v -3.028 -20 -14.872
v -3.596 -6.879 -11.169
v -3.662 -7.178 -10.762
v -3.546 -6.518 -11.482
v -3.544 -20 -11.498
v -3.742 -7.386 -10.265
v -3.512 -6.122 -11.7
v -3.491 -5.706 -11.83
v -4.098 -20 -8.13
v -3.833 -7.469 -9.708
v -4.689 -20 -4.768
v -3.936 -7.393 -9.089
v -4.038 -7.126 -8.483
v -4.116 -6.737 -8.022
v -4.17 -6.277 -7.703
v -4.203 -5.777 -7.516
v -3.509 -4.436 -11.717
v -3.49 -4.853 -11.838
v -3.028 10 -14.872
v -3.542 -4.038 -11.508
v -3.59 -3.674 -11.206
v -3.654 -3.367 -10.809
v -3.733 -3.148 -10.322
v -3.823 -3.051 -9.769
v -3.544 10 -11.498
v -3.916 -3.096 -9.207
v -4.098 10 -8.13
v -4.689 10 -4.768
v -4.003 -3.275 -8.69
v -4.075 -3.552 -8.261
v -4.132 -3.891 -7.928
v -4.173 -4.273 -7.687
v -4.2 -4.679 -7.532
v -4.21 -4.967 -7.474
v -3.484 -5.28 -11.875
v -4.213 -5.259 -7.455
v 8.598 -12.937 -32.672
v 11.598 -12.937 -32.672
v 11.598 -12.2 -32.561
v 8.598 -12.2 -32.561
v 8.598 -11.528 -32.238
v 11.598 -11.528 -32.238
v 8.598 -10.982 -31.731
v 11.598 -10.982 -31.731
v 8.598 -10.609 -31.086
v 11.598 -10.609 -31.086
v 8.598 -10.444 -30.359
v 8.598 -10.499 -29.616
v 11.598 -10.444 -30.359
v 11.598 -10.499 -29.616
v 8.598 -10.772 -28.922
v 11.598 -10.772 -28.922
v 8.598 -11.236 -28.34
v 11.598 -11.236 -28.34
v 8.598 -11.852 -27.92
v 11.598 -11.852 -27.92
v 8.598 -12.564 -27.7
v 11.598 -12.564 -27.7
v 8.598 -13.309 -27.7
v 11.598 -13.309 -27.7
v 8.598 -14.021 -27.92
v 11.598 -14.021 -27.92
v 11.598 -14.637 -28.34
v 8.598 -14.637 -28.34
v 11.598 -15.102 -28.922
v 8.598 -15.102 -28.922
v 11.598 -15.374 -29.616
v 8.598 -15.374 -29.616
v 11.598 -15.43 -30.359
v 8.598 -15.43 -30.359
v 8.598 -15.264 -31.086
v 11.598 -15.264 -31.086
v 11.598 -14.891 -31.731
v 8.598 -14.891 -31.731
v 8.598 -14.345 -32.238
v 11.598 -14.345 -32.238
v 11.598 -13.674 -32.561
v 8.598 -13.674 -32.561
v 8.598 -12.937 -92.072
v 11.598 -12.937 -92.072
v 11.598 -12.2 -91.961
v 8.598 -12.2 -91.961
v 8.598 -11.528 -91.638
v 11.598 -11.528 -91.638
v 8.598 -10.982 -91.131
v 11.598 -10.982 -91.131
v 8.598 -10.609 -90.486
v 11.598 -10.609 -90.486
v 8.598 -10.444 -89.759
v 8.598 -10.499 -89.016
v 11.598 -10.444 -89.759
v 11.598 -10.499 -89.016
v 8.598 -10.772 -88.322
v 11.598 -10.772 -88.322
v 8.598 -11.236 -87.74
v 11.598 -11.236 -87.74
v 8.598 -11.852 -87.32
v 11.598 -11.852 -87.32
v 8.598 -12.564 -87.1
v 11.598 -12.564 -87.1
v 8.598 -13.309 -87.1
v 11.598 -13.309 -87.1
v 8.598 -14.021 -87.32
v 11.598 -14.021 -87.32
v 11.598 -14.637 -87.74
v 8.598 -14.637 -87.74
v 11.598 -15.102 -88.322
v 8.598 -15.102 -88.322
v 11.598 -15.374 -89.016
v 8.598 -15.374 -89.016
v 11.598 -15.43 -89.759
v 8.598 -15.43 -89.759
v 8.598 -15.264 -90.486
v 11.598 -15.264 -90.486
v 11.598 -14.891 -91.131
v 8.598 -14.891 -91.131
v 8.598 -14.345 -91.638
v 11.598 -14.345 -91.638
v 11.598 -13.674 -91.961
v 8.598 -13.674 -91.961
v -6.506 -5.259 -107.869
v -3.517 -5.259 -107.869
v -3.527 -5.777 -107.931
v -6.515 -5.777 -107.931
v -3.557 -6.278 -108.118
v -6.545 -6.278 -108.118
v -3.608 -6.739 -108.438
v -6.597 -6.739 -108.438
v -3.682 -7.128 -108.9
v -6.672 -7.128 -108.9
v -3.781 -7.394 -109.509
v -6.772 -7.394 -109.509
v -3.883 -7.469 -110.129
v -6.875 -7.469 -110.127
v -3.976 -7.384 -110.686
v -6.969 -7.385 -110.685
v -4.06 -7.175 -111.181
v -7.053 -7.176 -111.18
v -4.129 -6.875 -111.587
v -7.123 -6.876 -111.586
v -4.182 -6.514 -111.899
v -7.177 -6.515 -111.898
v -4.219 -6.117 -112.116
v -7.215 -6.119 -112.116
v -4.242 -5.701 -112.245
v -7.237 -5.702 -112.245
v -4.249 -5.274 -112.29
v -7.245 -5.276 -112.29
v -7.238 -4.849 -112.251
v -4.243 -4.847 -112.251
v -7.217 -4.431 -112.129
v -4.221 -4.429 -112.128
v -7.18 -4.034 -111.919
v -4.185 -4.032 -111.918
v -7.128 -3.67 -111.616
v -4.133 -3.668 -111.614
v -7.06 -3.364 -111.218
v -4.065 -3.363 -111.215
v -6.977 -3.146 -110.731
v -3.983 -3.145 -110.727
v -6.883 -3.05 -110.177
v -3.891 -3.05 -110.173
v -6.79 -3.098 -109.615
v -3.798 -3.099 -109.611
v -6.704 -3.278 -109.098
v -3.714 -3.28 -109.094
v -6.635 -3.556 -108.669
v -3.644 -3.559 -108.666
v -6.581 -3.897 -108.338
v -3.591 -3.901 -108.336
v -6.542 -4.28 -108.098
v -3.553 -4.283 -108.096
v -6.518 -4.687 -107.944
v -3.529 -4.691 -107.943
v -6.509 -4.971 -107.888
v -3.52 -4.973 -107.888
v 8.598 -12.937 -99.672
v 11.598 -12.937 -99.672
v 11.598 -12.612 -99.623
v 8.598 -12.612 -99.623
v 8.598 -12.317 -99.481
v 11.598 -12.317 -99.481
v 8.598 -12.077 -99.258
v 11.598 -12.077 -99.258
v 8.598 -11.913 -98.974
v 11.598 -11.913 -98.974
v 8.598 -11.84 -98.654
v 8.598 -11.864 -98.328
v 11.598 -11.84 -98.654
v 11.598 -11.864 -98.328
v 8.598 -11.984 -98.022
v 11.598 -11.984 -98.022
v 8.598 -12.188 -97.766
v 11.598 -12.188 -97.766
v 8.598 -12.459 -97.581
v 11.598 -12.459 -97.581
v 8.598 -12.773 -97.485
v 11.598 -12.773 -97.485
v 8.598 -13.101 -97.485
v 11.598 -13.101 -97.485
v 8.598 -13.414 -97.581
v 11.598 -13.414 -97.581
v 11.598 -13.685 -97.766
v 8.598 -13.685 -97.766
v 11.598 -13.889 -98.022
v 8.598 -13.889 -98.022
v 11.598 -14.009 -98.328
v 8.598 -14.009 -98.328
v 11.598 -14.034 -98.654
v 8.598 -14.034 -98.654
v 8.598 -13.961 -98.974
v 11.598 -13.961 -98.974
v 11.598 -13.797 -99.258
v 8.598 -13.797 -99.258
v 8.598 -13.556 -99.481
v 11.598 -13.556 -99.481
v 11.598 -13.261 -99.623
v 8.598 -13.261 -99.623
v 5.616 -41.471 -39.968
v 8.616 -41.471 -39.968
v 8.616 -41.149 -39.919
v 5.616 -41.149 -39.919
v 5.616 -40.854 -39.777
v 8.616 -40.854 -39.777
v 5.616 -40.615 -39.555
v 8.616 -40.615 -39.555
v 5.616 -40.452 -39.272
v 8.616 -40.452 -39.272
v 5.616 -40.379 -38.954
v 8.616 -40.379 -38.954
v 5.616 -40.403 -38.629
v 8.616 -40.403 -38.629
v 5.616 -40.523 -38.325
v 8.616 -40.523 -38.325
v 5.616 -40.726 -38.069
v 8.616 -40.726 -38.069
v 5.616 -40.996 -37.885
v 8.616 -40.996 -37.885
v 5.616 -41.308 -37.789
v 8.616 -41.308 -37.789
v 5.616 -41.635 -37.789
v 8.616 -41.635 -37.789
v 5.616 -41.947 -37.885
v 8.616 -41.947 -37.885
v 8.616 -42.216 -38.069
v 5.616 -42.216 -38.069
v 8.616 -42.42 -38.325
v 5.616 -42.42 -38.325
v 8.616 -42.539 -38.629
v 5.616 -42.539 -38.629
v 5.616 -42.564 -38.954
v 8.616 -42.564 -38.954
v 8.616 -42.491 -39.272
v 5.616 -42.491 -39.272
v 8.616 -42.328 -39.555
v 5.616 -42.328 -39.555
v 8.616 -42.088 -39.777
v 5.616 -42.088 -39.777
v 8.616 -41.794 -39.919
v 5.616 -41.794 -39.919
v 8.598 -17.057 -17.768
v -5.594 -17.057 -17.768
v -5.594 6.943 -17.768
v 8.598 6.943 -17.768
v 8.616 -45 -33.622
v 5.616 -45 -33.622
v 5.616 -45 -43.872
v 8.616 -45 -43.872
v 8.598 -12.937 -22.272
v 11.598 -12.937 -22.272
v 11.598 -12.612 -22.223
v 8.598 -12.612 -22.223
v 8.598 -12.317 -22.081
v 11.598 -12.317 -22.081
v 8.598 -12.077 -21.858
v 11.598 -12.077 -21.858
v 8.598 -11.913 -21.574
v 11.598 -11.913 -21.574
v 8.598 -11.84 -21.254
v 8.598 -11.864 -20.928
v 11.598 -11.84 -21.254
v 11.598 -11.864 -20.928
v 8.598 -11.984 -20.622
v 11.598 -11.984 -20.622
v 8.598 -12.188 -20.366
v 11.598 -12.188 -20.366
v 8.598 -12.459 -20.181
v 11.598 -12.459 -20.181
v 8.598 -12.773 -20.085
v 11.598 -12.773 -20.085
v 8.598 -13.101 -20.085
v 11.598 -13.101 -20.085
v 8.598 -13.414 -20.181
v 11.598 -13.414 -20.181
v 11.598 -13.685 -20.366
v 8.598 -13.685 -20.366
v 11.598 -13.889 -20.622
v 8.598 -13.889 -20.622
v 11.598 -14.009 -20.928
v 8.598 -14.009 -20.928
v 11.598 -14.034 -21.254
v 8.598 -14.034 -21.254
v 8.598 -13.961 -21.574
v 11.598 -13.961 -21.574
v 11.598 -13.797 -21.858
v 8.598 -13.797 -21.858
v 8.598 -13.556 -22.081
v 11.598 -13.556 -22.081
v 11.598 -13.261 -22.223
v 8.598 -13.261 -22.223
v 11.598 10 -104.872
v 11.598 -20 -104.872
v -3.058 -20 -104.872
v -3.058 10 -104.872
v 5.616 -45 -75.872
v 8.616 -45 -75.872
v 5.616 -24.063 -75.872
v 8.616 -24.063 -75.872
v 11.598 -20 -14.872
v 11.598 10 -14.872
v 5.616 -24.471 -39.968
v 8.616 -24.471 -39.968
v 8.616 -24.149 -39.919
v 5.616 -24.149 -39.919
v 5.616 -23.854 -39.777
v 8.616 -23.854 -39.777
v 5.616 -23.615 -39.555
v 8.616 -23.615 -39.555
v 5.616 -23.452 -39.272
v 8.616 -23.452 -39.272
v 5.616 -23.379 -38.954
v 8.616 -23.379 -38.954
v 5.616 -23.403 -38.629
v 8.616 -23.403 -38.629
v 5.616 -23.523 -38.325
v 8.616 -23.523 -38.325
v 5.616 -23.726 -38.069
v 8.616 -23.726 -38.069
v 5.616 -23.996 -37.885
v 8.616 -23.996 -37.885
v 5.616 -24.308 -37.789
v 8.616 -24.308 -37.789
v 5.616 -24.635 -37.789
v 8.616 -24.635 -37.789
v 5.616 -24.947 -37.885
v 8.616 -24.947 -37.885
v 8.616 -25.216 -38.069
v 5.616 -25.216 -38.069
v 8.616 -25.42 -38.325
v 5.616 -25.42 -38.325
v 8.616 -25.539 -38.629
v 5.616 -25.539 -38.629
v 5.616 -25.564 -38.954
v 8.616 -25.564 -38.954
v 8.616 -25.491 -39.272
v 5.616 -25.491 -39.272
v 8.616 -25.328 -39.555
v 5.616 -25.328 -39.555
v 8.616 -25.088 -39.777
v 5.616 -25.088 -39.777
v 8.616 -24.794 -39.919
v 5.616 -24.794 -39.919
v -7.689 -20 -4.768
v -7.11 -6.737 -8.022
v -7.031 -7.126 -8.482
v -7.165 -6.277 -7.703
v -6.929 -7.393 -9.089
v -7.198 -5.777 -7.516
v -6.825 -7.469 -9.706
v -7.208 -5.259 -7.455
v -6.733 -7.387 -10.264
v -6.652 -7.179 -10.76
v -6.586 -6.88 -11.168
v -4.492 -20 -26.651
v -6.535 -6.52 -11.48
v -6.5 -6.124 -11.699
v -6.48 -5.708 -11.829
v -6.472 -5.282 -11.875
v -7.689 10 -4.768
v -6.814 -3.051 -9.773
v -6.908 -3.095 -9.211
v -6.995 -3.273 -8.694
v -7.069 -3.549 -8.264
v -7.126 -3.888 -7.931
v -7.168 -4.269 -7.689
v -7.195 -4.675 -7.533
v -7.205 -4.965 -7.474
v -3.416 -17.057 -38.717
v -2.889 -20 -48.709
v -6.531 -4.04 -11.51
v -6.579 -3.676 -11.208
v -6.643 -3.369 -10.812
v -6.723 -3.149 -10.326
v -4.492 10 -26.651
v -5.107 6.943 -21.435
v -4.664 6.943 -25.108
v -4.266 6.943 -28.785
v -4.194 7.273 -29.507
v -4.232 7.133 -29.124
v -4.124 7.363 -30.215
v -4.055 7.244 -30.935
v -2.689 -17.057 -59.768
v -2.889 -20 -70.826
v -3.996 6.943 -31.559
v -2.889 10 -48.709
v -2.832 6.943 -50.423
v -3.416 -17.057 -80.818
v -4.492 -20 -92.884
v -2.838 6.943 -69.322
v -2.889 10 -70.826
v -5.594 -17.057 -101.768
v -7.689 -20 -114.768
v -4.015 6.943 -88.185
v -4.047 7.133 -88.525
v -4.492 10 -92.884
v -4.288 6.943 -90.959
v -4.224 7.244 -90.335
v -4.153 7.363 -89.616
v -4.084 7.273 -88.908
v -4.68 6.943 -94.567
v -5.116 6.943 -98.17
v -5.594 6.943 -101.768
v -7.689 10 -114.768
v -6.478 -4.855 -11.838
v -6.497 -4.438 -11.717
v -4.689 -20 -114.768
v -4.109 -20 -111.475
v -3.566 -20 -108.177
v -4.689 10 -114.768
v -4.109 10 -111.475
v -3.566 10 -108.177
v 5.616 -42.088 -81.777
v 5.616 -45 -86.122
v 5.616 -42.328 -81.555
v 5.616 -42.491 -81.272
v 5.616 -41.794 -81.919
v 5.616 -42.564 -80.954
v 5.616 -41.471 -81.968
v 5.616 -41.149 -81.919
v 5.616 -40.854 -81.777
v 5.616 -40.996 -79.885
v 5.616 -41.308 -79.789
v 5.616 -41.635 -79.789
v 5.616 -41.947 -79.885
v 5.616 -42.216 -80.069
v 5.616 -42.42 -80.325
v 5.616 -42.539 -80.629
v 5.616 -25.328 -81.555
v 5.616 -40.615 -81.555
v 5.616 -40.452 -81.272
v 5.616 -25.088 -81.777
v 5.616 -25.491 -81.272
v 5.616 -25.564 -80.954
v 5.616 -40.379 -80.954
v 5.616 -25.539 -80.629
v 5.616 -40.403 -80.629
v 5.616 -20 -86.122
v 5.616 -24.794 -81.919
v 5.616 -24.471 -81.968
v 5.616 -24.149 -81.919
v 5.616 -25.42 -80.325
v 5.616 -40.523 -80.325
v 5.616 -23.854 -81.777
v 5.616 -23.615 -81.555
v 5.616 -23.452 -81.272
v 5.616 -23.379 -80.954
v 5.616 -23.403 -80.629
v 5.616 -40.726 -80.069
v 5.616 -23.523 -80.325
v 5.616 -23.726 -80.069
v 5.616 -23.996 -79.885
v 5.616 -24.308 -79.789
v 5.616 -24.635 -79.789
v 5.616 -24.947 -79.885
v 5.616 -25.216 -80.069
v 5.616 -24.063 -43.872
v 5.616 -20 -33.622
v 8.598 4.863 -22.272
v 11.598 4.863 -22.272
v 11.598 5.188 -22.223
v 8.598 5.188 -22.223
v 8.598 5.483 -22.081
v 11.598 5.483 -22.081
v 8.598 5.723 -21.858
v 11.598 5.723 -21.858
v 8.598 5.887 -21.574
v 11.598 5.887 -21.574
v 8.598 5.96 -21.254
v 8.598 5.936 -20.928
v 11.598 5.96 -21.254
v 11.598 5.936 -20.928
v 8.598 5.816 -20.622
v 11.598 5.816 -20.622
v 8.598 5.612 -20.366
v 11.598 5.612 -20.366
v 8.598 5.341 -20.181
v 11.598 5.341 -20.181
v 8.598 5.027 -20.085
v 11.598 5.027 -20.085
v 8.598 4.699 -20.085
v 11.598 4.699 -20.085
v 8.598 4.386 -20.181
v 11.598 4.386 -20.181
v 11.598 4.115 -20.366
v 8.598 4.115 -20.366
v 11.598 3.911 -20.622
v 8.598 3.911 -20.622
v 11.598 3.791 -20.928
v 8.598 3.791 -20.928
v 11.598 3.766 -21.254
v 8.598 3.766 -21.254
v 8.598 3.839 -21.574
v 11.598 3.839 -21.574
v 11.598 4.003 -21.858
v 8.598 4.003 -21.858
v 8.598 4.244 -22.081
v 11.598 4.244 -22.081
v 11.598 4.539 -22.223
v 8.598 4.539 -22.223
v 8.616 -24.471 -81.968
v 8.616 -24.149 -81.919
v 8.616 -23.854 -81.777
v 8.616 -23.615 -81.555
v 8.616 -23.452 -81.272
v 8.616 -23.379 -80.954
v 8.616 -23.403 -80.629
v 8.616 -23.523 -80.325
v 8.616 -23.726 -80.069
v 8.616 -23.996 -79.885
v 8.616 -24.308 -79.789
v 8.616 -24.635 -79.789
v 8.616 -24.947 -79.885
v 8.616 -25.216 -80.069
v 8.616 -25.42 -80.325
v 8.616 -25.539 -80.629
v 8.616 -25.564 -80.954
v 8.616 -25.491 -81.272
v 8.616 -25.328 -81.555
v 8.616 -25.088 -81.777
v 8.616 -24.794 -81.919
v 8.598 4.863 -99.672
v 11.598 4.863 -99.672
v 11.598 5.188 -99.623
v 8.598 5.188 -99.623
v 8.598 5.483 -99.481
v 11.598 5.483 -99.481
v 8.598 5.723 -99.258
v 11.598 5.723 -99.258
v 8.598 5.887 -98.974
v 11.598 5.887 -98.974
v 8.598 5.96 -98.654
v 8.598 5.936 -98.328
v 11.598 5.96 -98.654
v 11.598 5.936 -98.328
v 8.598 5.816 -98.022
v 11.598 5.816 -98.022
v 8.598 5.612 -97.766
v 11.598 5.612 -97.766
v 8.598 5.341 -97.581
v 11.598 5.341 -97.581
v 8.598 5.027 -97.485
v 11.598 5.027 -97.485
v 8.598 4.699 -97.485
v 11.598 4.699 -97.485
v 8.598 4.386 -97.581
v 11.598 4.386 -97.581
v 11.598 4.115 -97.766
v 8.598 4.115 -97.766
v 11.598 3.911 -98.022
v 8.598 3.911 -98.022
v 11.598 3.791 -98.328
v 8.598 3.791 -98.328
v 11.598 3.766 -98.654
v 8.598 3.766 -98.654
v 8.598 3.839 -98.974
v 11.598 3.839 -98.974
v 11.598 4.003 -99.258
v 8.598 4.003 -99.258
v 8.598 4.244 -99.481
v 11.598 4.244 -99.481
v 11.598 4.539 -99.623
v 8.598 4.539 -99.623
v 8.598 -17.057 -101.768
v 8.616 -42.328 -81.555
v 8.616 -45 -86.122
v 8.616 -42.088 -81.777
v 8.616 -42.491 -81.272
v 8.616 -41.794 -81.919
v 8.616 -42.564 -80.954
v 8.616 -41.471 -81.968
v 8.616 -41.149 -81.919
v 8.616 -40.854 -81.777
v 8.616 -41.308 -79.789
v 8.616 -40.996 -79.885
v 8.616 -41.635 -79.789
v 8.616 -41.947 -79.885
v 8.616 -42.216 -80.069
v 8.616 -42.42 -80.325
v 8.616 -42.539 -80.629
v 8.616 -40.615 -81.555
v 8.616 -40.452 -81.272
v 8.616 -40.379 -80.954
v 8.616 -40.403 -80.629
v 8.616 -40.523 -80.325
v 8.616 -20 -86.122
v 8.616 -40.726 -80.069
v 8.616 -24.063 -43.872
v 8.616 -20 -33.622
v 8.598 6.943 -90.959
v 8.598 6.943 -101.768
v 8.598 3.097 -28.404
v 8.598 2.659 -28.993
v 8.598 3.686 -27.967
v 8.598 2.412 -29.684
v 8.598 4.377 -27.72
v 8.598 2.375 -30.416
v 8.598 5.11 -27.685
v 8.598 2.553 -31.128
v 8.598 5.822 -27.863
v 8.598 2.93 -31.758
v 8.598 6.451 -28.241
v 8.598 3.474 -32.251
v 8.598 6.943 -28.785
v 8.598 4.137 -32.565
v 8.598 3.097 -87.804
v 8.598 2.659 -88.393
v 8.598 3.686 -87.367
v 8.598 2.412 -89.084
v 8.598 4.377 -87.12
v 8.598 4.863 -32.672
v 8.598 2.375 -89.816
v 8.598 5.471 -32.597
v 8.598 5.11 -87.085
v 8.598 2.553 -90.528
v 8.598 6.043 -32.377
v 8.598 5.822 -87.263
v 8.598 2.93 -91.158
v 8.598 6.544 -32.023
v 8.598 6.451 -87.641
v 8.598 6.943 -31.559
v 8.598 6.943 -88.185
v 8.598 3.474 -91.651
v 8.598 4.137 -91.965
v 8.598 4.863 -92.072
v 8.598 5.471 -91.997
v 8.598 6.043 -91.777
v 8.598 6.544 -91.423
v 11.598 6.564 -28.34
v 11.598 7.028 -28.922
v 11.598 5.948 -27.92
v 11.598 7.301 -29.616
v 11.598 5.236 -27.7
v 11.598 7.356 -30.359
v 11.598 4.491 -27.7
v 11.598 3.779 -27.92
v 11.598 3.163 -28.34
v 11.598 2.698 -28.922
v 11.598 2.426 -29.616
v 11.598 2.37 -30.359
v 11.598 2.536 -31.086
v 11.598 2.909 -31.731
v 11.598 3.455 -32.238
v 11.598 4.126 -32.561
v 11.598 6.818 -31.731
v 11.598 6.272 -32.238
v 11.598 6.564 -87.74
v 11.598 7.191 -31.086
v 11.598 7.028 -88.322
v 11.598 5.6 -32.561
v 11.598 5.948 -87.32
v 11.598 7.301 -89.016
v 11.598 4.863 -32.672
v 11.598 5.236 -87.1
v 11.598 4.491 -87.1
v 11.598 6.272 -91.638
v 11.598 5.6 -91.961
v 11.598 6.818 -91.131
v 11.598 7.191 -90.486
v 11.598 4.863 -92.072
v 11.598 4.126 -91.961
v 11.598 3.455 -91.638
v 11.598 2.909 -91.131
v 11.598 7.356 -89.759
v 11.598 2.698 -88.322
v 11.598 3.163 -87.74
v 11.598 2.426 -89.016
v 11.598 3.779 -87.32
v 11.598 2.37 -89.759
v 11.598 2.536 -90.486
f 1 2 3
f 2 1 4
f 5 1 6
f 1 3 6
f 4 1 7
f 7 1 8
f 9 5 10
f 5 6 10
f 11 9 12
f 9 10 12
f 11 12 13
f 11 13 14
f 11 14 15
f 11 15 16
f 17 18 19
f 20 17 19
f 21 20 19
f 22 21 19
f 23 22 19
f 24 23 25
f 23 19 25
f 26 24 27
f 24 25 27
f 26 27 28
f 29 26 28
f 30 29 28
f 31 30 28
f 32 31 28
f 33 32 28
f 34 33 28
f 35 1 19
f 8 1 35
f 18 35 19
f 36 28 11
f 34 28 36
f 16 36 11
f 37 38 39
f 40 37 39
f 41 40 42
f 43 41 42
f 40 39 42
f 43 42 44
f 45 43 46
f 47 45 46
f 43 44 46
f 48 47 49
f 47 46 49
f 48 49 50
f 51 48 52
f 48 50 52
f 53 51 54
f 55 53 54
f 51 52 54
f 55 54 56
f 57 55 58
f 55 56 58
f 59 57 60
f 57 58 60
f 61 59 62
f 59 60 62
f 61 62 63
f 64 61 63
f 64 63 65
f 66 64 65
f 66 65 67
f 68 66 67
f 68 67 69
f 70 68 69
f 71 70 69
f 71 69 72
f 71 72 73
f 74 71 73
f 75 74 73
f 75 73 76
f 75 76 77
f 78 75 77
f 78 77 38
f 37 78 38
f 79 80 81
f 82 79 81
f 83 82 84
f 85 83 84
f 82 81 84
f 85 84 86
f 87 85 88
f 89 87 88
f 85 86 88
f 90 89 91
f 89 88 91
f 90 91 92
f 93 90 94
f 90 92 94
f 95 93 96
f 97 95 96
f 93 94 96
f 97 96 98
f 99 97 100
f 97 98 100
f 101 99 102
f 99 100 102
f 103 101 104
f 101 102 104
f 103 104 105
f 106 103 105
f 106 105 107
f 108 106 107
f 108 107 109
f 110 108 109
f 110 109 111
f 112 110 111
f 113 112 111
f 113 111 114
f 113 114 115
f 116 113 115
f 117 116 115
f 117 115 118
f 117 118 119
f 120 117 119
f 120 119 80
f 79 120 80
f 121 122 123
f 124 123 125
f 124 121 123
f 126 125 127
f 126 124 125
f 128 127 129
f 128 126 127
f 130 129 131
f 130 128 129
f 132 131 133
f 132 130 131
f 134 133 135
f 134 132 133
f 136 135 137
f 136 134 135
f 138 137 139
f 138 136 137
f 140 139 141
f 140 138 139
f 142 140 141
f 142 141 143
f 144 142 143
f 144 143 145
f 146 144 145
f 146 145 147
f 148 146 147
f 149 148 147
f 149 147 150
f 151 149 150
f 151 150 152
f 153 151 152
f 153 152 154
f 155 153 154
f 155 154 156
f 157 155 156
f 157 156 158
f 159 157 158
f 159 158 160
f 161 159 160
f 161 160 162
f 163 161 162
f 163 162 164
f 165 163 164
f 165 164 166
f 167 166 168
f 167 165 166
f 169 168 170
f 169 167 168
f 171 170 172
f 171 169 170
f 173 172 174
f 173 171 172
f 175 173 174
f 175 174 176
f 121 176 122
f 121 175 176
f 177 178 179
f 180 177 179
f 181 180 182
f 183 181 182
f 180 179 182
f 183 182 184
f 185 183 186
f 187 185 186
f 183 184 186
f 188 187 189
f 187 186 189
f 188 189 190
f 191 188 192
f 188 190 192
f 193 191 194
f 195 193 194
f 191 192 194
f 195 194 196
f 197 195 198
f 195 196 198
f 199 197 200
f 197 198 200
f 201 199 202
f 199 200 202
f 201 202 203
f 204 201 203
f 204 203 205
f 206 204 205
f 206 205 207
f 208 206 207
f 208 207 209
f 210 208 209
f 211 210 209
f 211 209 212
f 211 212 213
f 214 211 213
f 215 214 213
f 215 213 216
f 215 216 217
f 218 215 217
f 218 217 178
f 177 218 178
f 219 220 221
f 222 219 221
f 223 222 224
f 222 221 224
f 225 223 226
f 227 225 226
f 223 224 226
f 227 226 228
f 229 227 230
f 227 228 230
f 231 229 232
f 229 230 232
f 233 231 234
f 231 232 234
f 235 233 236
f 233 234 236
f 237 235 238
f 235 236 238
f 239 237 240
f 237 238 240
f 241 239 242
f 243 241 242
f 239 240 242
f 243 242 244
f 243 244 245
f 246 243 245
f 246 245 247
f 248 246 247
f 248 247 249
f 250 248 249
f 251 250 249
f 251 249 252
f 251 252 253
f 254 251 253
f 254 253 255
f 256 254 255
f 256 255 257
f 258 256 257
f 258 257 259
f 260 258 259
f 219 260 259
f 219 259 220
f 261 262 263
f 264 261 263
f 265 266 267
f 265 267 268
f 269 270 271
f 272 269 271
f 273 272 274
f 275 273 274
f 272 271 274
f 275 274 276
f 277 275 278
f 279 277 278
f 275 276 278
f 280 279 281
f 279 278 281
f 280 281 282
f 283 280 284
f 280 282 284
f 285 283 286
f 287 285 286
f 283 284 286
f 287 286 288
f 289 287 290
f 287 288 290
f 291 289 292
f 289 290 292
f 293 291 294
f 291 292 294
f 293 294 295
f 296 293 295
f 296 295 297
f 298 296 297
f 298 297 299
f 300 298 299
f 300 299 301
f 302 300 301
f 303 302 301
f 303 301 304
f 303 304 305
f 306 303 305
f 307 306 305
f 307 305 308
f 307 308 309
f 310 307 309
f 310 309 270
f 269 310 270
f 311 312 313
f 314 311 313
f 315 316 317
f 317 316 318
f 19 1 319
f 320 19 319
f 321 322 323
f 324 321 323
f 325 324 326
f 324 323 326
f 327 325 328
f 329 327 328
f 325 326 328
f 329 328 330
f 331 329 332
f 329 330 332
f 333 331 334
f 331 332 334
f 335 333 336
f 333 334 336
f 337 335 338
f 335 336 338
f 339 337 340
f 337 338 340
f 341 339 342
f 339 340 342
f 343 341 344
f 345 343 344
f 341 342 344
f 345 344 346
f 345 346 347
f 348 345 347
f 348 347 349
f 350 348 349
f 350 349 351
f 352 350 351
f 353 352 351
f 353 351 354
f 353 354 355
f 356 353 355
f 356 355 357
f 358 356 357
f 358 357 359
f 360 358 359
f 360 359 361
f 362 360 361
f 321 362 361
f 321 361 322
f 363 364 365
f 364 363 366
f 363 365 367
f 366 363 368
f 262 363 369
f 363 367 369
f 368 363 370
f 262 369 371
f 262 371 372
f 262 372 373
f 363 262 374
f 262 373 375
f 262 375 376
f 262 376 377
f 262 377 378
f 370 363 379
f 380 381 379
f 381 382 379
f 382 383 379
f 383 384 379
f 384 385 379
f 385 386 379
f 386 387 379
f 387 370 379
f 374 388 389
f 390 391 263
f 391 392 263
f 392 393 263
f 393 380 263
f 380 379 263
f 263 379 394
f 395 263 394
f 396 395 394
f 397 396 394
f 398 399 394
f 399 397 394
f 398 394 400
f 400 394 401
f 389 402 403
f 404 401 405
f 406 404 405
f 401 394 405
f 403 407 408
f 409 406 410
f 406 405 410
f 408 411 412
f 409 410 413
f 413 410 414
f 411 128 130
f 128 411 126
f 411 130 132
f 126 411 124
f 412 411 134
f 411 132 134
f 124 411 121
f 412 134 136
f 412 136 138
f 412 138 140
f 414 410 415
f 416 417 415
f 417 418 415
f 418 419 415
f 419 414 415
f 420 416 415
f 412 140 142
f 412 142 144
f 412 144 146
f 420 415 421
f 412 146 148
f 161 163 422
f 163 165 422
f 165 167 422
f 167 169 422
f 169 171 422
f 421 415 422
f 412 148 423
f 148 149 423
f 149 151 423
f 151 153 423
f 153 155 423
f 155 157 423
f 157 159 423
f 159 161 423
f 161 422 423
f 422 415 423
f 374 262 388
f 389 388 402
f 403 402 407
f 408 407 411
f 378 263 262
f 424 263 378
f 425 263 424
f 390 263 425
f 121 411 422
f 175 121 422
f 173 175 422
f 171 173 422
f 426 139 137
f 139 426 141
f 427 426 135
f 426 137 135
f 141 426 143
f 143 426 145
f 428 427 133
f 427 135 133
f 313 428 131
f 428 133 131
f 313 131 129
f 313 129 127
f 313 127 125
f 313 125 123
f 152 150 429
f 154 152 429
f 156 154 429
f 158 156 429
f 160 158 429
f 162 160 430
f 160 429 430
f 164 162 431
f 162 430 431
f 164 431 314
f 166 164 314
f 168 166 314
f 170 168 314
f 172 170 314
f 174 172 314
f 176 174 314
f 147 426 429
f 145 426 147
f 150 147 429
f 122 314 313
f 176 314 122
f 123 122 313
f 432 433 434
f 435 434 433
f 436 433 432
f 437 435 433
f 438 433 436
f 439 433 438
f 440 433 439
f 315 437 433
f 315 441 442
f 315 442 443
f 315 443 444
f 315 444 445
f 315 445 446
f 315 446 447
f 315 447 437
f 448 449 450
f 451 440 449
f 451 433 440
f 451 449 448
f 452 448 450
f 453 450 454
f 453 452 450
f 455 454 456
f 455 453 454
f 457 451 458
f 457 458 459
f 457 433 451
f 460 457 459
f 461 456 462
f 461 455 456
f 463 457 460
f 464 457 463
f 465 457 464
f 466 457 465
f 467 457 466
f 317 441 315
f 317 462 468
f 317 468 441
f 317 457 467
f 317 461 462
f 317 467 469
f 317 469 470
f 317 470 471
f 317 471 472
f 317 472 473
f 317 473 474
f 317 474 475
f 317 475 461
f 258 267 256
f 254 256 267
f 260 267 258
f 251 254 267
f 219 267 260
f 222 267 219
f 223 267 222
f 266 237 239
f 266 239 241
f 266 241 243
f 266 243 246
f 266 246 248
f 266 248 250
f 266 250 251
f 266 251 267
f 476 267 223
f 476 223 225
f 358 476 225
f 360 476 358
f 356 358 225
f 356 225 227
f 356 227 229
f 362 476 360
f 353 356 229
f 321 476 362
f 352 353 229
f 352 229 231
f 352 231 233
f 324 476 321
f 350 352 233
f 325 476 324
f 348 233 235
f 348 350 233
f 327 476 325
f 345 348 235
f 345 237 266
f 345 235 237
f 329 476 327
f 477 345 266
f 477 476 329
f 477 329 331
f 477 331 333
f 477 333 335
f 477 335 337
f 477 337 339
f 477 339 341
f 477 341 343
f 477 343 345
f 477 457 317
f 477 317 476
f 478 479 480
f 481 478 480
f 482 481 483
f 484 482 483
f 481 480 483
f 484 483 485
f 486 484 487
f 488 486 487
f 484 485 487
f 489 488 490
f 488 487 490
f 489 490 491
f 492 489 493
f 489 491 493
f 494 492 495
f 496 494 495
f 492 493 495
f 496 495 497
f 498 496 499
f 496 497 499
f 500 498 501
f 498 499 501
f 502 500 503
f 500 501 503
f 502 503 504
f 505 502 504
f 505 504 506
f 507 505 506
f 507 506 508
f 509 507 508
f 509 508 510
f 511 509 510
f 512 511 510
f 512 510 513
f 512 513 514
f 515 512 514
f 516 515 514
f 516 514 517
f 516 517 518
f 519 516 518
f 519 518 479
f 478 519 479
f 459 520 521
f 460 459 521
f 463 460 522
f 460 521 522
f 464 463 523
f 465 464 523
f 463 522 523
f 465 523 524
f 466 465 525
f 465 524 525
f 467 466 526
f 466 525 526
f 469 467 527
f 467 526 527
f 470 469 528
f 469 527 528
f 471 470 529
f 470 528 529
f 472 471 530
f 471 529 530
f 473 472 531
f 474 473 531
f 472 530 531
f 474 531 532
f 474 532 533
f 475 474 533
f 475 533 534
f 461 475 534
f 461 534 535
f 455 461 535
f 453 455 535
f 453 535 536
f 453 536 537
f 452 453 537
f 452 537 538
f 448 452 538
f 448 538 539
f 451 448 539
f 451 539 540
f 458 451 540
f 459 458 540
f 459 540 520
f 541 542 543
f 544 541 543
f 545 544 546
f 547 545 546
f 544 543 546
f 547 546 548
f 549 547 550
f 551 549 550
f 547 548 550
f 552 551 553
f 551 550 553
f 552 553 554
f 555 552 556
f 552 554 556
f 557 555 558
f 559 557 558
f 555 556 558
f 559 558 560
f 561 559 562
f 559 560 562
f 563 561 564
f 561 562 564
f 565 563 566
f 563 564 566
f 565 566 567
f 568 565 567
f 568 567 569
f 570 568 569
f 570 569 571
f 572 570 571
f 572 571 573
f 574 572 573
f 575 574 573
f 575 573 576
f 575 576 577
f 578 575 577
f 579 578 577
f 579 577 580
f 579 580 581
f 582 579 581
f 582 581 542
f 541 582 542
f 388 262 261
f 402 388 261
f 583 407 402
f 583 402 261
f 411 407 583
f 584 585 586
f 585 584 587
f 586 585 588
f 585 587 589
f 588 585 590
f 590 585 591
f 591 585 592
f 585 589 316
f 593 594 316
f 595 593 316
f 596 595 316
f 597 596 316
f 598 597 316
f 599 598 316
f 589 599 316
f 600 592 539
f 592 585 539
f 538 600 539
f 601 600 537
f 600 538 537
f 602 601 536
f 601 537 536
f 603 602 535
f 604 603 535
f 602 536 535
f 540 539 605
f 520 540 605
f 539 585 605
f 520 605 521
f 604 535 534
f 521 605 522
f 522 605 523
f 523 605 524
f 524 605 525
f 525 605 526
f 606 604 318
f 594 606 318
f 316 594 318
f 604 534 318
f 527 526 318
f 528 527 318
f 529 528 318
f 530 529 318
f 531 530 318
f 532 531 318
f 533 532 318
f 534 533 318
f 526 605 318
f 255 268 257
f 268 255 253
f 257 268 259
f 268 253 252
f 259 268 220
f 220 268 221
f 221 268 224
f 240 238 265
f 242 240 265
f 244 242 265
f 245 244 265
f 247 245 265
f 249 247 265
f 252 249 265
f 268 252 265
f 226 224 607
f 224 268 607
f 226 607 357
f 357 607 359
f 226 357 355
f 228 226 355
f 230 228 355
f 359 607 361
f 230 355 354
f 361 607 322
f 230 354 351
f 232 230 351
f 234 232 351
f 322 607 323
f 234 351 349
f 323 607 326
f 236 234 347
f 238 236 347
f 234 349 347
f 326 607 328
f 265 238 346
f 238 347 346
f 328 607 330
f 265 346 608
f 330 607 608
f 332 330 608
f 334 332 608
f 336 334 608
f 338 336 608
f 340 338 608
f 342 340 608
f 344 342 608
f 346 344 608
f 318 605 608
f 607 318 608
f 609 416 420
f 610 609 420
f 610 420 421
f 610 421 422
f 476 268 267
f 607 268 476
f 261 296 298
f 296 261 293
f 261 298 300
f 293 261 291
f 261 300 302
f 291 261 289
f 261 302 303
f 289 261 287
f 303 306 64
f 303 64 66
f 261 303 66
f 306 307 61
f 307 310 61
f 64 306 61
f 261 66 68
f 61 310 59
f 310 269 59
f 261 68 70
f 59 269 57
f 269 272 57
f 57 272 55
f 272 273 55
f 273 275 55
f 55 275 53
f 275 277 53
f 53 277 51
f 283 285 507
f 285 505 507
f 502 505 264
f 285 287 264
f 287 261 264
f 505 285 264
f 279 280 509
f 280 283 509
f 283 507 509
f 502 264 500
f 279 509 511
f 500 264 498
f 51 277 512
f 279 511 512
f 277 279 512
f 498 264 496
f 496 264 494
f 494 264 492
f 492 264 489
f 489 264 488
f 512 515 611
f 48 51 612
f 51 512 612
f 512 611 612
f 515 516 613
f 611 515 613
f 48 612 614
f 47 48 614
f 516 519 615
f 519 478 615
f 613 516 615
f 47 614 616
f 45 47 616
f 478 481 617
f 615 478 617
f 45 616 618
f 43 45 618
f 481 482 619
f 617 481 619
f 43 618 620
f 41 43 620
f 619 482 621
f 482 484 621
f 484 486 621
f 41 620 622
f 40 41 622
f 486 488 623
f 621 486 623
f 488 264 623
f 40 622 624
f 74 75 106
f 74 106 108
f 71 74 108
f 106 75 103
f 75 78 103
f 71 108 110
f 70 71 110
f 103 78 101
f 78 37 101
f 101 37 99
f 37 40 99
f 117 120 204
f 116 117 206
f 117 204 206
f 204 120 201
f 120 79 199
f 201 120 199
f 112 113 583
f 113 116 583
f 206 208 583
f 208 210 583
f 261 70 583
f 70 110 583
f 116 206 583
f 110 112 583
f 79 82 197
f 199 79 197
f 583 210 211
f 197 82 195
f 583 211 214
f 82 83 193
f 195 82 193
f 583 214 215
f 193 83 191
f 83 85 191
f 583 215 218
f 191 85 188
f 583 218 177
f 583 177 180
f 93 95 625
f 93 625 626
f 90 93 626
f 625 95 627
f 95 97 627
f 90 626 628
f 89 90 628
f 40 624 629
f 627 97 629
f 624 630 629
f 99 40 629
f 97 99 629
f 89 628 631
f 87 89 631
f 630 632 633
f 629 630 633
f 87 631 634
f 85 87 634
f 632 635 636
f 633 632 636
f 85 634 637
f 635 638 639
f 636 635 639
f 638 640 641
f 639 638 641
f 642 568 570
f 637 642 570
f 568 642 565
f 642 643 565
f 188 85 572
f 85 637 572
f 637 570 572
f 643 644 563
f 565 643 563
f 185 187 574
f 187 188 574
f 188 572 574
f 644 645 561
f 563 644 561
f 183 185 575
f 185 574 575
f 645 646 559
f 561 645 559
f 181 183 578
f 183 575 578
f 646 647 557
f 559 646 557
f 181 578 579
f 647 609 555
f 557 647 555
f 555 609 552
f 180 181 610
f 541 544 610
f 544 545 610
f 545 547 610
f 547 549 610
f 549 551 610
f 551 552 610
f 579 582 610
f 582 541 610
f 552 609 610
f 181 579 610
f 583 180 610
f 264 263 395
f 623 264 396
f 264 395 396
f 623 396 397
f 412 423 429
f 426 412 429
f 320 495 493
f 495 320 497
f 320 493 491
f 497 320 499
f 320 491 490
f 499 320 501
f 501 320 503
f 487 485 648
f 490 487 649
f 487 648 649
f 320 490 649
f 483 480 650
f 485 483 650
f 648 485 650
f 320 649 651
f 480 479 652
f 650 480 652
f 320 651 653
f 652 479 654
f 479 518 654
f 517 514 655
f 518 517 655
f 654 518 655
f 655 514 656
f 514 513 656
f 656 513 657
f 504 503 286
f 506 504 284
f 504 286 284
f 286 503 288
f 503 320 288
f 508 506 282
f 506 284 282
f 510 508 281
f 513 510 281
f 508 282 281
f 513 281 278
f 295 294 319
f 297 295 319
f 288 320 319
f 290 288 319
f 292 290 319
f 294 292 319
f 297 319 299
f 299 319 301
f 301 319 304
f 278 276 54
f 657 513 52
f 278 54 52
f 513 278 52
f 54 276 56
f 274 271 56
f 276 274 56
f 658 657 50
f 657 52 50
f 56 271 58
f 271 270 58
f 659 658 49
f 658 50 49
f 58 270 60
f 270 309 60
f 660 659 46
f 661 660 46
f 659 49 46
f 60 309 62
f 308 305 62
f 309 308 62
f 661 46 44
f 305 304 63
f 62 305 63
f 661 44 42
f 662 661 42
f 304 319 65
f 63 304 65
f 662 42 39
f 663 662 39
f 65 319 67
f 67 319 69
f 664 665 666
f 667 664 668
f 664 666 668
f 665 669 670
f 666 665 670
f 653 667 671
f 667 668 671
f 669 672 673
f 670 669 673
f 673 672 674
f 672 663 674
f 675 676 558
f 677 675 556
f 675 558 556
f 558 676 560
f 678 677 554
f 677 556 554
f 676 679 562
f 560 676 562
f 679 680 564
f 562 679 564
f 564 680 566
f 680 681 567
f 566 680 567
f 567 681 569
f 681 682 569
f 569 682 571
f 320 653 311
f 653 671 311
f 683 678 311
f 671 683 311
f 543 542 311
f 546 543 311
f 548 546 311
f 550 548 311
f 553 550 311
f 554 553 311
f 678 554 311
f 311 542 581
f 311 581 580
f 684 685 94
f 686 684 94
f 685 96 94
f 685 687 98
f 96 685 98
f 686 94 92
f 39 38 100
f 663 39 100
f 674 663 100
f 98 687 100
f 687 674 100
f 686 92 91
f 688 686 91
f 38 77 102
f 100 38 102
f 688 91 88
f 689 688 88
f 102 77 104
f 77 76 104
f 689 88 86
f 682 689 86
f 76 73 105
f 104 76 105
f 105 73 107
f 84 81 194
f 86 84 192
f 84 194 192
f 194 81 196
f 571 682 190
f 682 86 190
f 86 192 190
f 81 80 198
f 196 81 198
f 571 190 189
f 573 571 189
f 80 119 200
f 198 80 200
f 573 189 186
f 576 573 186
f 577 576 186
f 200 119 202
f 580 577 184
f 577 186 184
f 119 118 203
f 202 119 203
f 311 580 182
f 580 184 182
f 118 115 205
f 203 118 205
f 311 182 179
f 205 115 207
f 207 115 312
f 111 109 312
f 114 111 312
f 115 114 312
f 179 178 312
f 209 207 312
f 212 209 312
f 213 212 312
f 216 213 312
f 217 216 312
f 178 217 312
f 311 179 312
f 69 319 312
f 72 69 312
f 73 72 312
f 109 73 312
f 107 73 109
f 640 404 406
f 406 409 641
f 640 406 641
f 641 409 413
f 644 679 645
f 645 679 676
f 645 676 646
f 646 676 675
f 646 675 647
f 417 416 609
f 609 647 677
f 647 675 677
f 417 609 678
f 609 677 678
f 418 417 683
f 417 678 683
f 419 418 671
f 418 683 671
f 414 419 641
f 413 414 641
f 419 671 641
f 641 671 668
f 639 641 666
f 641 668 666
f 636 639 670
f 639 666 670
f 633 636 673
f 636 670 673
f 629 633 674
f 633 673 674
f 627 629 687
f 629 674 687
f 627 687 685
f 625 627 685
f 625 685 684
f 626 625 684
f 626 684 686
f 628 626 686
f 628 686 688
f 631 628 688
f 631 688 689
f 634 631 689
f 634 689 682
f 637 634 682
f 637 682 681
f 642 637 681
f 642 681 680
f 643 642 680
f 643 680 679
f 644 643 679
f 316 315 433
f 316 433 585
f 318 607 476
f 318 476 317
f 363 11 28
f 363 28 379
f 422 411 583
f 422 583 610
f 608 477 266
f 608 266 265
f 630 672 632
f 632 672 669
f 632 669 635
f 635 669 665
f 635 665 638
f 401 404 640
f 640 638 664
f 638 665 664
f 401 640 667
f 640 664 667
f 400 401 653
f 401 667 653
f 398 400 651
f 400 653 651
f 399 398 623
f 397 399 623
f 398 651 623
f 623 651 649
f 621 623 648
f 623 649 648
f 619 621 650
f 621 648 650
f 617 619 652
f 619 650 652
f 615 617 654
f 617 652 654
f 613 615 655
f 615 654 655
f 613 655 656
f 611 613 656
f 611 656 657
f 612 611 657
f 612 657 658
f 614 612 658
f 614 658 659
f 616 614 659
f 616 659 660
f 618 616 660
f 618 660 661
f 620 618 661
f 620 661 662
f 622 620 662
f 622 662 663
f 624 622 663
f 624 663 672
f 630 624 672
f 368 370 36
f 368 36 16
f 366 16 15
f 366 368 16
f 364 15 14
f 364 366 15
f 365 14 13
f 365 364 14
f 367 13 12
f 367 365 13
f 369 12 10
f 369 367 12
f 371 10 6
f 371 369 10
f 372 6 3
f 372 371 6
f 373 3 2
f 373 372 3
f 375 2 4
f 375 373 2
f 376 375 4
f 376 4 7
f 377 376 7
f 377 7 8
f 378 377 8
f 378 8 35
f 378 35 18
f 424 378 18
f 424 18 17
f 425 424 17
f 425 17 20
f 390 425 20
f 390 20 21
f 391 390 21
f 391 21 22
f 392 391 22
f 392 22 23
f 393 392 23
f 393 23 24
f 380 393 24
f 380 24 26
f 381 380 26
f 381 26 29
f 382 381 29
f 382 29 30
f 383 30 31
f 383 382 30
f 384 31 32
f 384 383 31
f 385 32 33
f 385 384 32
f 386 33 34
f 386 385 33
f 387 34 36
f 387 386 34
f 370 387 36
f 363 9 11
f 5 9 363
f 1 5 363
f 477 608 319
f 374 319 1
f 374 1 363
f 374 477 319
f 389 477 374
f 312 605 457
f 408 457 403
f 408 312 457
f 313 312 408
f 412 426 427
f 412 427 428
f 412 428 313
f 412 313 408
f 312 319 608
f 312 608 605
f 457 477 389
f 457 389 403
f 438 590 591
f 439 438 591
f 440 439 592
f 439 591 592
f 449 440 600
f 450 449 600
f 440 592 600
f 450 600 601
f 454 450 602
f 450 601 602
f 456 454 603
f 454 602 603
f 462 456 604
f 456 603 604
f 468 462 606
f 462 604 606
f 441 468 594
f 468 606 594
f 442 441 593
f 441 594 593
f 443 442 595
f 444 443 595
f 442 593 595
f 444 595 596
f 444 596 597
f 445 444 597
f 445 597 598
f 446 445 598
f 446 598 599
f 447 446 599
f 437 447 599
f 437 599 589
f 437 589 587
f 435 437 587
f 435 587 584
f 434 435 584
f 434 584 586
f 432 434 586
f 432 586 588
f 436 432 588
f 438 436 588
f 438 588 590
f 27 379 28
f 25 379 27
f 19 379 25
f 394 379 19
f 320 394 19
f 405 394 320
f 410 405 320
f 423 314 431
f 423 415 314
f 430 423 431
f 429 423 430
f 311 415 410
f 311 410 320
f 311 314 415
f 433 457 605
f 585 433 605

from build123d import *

# Parameters (mm, degrees)
EXTRUDE_1_DEPTH      = 10
EXTRUDE_1_DEPTH_BACK = 20
EXTRUDE_2_DEPTH      = 20
EXTRUDE_3_DEPTH      = 10
SKETCH_5_W           = 84
SKETCH_5_H           = 24
CUT_EXTRUDE_1_DEPTH  = 17
SKETCH_4_R           = 2.5
SKETCH_4_R_2         = 1.1
CUT_EXTRUDE_2_DEPTH  = 17
SKETCH_6_R           = 2.210367197
CUT_EXTRUDE_3_DEPTH  = 8
SKETCH_7_W           = 3
SKETCH_7_H           = 52.500208742
EXTRUDE_4_DEPTH      = 25
SKETCH_8_R           = 1.095411725
SKETCH_8_W           = 32
SKETCH_8_H           = 20.937005418
CUT_EXTRUDE_6_DEPTH  = 5


with BuildPart() as part:
    # Sketch 1 → Extrude 1 (new body, two sides)
    with BuildSketch(Plane(origin=(0, 0, 0), x_dir=(1, 0, 0), z_dir=(0, 1, 0))) as extrude_1_sk:
        with BuildLine():
            ThreePointArc((-4.68866799, 114.767541166), (0.26262686, 59.767541166), (-4.68866799, 4.767541166))
            Line((-4.68866799, 4.767541166), (-7.68866799, 4.767541166))
            ThreePointArc((-7.68866799, 4.767541166), (-2.68866799, 59.767541166), (-7.68866799, 114.767541166))
            Line((-7.68866799, 114.767541166), (-4.68866799, 114.767541166))
        make_face()
    extrude(amount=EXTRUDE_1_DEPTH)
    extrude(extrude_1_sk.sketch, amount=-EXTRUDE_1_DEPTH_BACK)



with BuildPart() as body_2:
    # Sketch 1_3 → Extrude 2 (new body)
    with BuildSketch(Plane(origin=(0, 0, 0), x_dir=(1, 0, 0), z_dir=(0, 1, 0))):
        with BuildLine():
            Line((11.598251721, 104.872295398), (-3.058464061, 104.872295398))
            ThreePointArc((-3.058464061, 104.872295398), (0.262608655, 59.873432048), (-3.027517025, 14.872295398))
            Line((-3.027517025, 14.872295398), (11.598251721, 14.872295398))
            Line((11.598251721, 14.872295398), (11.598251721, 104.872295398))
        make_face()
    extrude(amount=-EXTRUDE_2_DEPTH)


with BuildPart() as part_1:
    add(part.part)

    add(body_2.part)  # Extrude 3 merges body 2
    # Sketch 1_4 → Extrude 3 (add)
    with BuildSketch(Plane(origin=(0, 0, 0), x_dir=(1, 0, 0), z_dir=(0, 1, 0))):
        with BuildLine():
            Line((11.598251721, 104.872295398), (-3.058464061, 104.872295398))
            ThreePointArc((-3.058464061, 104.872295398), (0.262608655, 59.873432048), (-3.027517025, 14.872295398))
            Line((-3.027517025, 14.872295398), (11.598251721, 14.872295398))
            Line((11.598251721, 14.872295398), (11.598251721, 104.872295398))
        make_face()
    extrude(amount=EXTRUDE_3_DEPTH)

    # Sketch 5 → Cut-Extrude 1 (cut)
    with BuildSketch(Plane(origin=(-8.401748279, 0, 0), x_dir=(0, 0, -1), z_dir=(1, 0, 0))):
        with Locations((59.767541166, -5.056638817)):
            Rectangle(SKETCH_5_W, SKETCH_5_H)
    extrude(amount=CUT_EXTRUDE_1_DEPTH, mode=Mode.SUBTRACT)

    # Sketch 4 → Cut-Extrude 2 (cut)
    with BuildSketch(Plane(origin=(11.598251721, 0, 0), x_dir=(0, 0, -1), z_dir=(1, 0, 0))):
        with Locations((30.172295398, 4.863328118)):
            Circle(SKETCH_4_R)
        with Locations((89.572295398, 4.863328118)):
            Circle(SKETCH_4_R)
        with Locations((89.572295398, -12.936671882)):
            Circle(SKETCH_4_R)
        with Locations((30.172295398, -12.936671882)):
            Circle(SKETCH_4_R)
        with Locations((21.172295398, -12.936671882)):
            Circle(SKETCH_4_R_2)
        with Locations((21.172295398, 4.863328118)):
            Circle(SKETCH_4_R_2)
        with Locations((98.572295398, 4.863328118)):
            Circle(SKETCH_4_R_2)
        with Locations((98.572295398, -12.936671882)):
            Circle(SKETCH_4_R_2)
    extrude(amount=-CUT_EXTRUDE_2_DEPTH, mode=Mode.SUBTRACT)

    # Sketch 6 → Cut-Extrude 3 (cut)
    with BuildSketch(Plane(origin=(-8.401748279, 0, 0), x_dir=(0, 0, -1), z_dir=(1, 0, 0))):
        with Locations(Location((9.665216794, -5.258703912, 0), (0, 0, 180))):  # turned: the seam where the file's is
            Circle(SKETCH_6_R)
        with Locations(Location((110.079374003, -5.258703912, 0), (0, 0, 180))):  # turned: the seam where the file's is
            Circle(SKETCH_6_R)
    extrude(amount=CUT_EXTRUDE_3_DEPTH, mode=Mode.SUBTRACT)

    # Sketch 7 → Extrude 4 (add)
    with BuildSketch(Plane.XZ.offset(20)):
        with Locations((7.115575895, -59.872295398)):
            Rectangle(SKETCH_7_W, SKETCH_7_H)
    extrude(amount=EXTRUDE_4_DEPTH)

    # Sketch 8 → Cut-Extrude 6 (cut)
    with BuildSketch(Plane(origin=(8.615575895, 0, 0), x_dir=(0, 0, -1), z_dir=(1, 0, 0))):
        with Locations((38.872295398, -24.471390048)):
            Circle(SKETCH_8_R)
        with Locations((38.872295398, -41.471390048)):
            Circle(SKETCH_8_R)
        with Locations((80.872295398, -41.471390048)):
            Circle(SKETCH_8_R)
        with Locations((80.872295398, -24.471390048)):
            Circle(SKETCH_8_R)
        with Locations((59.872295398, -34.531497291)):
            Rectangle(SKETCH_8_W, SKETCH_8_H)
    extrude(amount=-CUT_EXTRUDE_6_DEPTH, mode=Mode.SUBTRACT)


solid = part_1.part
